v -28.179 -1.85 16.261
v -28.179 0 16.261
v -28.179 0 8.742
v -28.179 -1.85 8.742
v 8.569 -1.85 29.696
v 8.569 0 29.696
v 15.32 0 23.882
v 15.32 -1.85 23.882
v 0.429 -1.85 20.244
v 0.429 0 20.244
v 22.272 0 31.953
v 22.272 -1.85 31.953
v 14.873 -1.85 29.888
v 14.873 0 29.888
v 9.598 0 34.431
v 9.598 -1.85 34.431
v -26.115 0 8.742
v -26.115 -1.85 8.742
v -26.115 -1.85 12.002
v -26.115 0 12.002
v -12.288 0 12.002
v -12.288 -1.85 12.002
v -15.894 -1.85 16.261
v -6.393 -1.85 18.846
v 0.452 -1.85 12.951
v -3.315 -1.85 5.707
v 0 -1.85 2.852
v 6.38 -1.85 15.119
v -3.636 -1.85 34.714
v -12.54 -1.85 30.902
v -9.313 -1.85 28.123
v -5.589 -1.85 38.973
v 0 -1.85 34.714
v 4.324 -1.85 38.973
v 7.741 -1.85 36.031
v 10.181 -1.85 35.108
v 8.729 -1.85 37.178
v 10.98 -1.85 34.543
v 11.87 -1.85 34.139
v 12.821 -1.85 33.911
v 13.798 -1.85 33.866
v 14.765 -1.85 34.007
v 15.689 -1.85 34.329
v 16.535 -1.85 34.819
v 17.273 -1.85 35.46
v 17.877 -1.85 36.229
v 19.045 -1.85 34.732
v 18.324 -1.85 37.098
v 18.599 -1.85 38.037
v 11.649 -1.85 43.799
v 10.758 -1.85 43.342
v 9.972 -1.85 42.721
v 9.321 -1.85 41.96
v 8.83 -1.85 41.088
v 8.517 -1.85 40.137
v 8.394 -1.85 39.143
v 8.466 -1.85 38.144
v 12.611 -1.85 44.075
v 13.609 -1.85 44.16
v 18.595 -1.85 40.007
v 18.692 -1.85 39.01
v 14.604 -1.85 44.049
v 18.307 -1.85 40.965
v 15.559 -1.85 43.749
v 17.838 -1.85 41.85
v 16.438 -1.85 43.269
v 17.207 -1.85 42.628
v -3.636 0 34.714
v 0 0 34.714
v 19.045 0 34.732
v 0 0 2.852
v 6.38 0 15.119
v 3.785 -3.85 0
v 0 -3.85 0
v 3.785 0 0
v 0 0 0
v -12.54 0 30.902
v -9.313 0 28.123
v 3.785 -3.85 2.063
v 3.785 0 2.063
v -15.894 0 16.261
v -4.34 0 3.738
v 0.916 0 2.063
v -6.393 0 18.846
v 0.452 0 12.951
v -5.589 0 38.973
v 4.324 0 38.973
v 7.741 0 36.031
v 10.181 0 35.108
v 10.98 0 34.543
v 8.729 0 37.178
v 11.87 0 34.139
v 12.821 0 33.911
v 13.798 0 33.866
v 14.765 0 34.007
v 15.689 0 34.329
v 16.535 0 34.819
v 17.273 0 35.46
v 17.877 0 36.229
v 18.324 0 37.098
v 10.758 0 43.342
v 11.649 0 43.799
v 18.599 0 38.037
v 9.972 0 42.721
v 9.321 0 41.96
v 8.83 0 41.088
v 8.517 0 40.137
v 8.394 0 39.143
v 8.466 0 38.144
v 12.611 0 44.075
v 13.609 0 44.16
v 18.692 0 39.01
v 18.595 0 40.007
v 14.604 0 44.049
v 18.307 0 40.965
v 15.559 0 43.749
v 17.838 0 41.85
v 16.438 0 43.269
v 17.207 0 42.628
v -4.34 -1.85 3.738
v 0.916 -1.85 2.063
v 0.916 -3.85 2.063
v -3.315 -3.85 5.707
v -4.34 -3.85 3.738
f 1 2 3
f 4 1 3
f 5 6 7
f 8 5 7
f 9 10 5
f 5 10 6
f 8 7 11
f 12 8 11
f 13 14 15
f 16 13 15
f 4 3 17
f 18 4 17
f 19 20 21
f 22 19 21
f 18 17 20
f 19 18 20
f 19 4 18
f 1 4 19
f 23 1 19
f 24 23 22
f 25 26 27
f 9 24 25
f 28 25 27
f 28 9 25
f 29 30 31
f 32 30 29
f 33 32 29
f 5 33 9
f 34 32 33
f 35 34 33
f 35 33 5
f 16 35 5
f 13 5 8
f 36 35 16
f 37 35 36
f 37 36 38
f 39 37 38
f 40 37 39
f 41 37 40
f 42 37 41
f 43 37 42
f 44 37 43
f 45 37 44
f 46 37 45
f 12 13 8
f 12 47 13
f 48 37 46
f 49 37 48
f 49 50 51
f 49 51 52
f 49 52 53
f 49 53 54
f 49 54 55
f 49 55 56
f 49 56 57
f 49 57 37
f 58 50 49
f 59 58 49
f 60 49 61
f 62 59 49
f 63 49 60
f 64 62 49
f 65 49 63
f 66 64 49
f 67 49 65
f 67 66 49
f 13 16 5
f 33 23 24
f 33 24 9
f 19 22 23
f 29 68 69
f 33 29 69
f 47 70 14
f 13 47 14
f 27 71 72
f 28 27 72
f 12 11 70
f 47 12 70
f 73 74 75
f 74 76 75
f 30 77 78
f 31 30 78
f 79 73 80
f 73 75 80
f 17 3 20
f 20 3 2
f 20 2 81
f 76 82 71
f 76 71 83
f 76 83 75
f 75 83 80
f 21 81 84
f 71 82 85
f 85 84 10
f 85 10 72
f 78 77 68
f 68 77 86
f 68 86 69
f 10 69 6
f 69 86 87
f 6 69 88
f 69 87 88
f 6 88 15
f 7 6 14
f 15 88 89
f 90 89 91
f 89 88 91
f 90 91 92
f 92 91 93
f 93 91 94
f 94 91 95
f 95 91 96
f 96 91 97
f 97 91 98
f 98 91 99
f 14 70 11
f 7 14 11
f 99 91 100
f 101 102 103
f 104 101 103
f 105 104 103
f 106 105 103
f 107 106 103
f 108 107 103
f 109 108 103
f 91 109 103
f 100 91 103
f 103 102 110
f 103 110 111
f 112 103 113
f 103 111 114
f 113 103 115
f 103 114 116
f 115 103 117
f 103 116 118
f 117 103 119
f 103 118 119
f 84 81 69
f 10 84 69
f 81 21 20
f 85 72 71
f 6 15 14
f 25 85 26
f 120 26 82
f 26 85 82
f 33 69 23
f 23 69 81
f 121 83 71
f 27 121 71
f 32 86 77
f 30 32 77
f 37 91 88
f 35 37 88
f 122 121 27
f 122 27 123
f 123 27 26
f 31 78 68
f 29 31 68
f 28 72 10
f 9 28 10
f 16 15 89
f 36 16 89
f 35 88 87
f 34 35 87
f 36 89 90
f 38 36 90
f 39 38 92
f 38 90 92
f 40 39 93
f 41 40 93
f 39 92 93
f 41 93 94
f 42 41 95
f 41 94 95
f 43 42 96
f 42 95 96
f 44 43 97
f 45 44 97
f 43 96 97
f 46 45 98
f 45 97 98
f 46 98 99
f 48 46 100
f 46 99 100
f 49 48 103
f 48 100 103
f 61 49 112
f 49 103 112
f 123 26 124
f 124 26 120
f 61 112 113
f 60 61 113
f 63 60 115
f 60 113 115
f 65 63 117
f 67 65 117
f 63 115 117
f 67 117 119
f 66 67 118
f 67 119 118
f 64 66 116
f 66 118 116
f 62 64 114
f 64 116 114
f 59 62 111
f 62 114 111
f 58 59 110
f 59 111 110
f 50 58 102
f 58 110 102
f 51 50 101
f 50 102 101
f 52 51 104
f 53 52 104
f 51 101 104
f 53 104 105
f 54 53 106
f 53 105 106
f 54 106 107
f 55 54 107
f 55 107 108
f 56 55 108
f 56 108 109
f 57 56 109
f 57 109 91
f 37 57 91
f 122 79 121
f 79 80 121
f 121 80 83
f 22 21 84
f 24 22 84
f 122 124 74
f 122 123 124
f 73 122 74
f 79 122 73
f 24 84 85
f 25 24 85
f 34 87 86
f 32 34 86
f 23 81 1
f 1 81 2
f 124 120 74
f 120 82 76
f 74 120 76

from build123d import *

# Parameters (mm, degrees)
F1_DEPTH = 1.85
F3_DEPTH = 2


with BuildPart() as f1:
    # F0 (on Front) → F1 (new body)
    with BuildSketch(Plane.XZ):
        with BuildLine():
            ThreePointArc((10.181424, 35.10782), (15.688682, 34.328624), (18.692279, 39.010018))
            ThreePointArc((18.692279, 39.010018), (12.611069, 44.075129), (8.729038, 37.178296))
            ThreePointArc((8.729038, 37.178296), (9.326157, 36.052516), (10.181424, 35.10782))
        make_face()
        with BuildLine():
            ThreePointArc((10.181424, 35.10782), (9.326157, 36.052516), (8.729038, 37.178296))
            Line((8.729038, 37.178296), (7.740627, 36.03068))
            Line((7.740627, 36.03068), (9.598273, 34.43074))
            Line((9.598273, 34.43074), (10.181424, 35.10782))
        make_face()
        Polygon((9.598273, 34.43074), (7.740627, 36.03068), (4.324033, 38.973298), (-5.589027, 38.973298), (-12.540483, 30.902152), (-9.313422, 28.122773), (-3.636302, 34.714323), (0, 34.714323), (-15.893627, 16.260666), (-28.178568, 16.260666), (-28.178568, 8.741623), (-26.115432, 8.741623), (-26.115432, 12.00169), (-12.288238, 12.00169), (-6.393013, 18.846476), (0.451773, 12.951251), (-4.339739, 3.737698), (0, 0), (3.78513, 0), (3.78513, 2.063135), (0.915639, 2.063135), (0, 2.85175), (6.379701, 15.119216), (0.429039, 20.244357), (8.569453, 29.69597), (15.320196, 23.881742), (22.271652, 31.952888), (19.044591, 34.732267), (14.872513, 29.888182), align=None)
    extrude(amount=F1_DEPTH)

    # F2 (on face) → F3 (join)
    with BuildSketch(Plane.XZ.offset(1.85)):
        Polygon((-4.339739, 3.737698), (0, 0), (3.78513, 0), (3.78513, 2.063135), (0.915639, 2.063135), (-3.315463, 5.707268), align=None)
    extrude(amount=F3_DEPTH)


solid = f1.part
